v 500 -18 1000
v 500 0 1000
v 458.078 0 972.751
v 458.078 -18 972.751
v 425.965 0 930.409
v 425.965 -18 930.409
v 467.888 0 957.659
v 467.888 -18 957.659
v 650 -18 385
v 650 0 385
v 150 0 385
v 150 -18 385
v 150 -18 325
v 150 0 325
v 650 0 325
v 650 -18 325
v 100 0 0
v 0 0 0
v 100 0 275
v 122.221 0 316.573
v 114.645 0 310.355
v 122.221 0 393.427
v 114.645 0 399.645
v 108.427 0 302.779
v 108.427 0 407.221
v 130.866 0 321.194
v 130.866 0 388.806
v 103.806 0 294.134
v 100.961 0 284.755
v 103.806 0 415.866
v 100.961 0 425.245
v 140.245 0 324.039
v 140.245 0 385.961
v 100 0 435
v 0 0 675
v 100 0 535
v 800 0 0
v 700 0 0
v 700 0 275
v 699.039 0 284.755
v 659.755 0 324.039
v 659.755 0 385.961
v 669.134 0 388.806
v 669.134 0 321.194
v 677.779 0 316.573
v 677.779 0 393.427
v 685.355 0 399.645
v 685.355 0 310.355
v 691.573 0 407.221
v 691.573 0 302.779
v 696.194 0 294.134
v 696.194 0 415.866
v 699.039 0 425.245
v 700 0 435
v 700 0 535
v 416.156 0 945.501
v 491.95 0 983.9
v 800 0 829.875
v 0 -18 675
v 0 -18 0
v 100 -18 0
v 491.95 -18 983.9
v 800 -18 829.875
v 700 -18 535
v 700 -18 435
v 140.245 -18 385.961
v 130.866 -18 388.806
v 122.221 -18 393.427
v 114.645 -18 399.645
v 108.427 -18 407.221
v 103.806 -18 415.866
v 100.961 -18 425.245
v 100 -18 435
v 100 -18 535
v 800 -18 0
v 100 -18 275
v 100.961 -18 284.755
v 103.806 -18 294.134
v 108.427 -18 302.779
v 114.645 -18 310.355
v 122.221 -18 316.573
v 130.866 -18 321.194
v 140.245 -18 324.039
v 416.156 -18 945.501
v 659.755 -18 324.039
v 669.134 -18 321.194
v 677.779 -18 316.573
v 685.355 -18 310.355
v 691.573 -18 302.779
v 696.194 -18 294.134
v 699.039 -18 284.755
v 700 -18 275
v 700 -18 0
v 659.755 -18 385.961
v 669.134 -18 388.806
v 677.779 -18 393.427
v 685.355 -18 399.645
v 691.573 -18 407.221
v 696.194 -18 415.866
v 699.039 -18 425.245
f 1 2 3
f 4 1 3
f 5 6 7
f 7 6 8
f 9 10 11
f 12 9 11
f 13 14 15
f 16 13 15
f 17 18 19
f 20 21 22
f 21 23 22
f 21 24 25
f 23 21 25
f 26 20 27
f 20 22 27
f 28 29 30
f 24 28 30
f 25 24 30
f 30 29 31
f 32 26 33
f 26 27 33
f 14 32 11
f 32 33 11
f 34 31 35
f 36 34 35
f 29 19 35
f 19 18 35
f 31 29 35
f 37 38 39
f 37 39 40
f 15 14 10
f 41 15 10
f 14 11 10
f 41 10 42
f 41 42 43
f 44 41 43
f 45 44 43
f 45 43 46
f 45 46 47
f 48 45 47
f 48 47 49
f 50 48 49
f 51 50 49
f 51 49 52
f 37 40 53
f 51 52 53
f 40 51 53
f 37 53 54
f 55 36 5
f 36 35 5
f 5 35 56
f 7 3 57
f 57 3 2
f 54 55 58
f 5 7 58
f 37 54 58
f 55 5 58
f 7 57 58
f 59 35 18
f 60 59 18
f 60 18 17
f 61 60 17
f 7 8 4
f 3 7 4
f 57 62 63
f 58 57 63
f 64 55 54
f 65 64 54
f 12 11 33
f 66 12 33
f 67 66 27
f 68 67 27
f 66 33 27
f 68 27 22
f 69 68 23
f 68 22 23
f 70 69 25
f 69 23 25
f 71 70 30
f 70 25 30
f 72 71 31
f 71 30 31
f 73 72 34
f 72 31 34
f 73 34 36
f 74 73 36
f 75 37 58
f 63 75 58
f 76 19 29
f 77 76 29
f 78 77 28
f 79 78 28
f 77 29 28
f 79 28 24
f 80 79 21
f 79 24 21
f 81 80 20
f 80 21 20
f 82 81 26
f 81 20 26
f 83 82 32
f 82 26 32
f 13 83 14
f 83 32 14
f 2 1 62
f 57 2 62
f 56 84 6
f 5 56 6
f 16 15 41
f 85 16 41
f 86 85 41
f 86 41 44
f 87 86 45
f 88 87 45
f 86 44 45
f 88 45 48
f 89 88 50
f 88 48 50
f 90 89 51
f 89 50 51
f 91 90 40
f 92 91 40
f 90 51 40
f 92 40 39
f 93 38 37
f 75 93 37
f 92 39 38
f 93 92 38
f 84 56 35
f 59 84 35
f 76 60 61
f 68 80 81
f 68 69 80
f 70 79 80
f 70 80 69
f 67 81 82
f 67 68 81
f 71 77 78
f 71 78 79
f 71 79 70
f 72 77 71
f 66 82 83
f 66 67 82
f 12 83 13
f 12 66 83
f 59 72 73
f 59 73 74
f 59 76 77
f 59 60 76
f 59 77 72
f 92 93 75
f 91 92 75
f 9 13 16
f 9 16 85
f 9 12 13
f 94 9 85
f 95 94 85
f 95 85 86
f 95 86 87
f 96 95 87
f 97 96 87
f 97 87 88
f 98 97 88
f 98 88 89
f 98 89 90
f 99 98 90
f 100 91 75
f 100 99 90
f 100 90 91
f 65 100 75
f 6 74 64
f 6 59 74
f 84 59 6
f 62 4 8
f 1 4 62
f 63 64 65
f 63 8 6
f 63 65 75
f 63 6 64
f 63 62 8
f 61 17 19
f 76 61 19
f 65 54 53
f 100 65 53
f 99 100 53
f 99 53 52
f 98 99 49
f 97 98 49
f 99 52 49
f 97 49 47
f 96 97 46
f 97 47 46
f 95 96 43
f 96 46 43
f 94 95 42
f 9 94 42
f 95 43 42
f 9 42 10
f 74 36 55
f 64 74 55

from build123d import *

# Parameters (mm, degrees)
F1_DEPTH = 18
F5_DEPTH = 18
F7_DEPTH = 18


with BuildPart() as f1:
    # F0 (on Front) → F1 (new body)
    with BuildSketch(Plane.XZ):
        with BuildLine():
            Line((0, 675), (0, 0))
            Line((0, 0), (100, 0))
            Line((100, 0), (100, 275))
            ThreePointArc((100, 275), (114.644661, 310.355339), (150, 325))
            Line((150, 325), (650, 325))
            ThreePointArc((650, 325), (685.355339, 310.355339), (700, 275))
            Line((700, 275), (700, 0))
            Line((700, 0), (800, 0))
            Line((800, 0), (800, 850))
            Line((800, 850), (500, 1000))
            Line((500, 1000), (0, 675))
        make_face()
        with BuildLine():
            Line((650, 385), (150, 385))
            ThreePointArc((150, 385), (114.644661, 399.644661), (100, 435))
            Line((100, 435), (100, 535))
            Line((100, 535), (700, 535))
            Line((700, 535), (700, 435))
            ThreePointArc((700, 435), (685.355339, 399.644661), (650, 385))
        make_face(mode=Mode.SUBTRACT)
    extrude(amount=F1_DEPTH)

    # F4 (on face) → F5 (cut, through all)
    with BuildSketch(Plane.XZ.offset(18)):
        Polygon((458.077819, 972.750582), (416.155638, 945.501165), (425.965429, 930.40918), (467.887609, 957.658597), align=None)
    extrude(amount=-F5_DEPTH, mode=Mode.SUBTRACT)

    # F6 (on face) → F7 (cut, through all)
    with BuildSketch(Plane.XZ.offset(18)):
        Polygon((857.770876, 821.114562), (500, 1000), (491.950155, 983.900311), (849.721032, 805.014872), align=None)
    extrude(amount=-F7_DEPTH, mode=Mode.SUBTRACT)


solid = f1.part
